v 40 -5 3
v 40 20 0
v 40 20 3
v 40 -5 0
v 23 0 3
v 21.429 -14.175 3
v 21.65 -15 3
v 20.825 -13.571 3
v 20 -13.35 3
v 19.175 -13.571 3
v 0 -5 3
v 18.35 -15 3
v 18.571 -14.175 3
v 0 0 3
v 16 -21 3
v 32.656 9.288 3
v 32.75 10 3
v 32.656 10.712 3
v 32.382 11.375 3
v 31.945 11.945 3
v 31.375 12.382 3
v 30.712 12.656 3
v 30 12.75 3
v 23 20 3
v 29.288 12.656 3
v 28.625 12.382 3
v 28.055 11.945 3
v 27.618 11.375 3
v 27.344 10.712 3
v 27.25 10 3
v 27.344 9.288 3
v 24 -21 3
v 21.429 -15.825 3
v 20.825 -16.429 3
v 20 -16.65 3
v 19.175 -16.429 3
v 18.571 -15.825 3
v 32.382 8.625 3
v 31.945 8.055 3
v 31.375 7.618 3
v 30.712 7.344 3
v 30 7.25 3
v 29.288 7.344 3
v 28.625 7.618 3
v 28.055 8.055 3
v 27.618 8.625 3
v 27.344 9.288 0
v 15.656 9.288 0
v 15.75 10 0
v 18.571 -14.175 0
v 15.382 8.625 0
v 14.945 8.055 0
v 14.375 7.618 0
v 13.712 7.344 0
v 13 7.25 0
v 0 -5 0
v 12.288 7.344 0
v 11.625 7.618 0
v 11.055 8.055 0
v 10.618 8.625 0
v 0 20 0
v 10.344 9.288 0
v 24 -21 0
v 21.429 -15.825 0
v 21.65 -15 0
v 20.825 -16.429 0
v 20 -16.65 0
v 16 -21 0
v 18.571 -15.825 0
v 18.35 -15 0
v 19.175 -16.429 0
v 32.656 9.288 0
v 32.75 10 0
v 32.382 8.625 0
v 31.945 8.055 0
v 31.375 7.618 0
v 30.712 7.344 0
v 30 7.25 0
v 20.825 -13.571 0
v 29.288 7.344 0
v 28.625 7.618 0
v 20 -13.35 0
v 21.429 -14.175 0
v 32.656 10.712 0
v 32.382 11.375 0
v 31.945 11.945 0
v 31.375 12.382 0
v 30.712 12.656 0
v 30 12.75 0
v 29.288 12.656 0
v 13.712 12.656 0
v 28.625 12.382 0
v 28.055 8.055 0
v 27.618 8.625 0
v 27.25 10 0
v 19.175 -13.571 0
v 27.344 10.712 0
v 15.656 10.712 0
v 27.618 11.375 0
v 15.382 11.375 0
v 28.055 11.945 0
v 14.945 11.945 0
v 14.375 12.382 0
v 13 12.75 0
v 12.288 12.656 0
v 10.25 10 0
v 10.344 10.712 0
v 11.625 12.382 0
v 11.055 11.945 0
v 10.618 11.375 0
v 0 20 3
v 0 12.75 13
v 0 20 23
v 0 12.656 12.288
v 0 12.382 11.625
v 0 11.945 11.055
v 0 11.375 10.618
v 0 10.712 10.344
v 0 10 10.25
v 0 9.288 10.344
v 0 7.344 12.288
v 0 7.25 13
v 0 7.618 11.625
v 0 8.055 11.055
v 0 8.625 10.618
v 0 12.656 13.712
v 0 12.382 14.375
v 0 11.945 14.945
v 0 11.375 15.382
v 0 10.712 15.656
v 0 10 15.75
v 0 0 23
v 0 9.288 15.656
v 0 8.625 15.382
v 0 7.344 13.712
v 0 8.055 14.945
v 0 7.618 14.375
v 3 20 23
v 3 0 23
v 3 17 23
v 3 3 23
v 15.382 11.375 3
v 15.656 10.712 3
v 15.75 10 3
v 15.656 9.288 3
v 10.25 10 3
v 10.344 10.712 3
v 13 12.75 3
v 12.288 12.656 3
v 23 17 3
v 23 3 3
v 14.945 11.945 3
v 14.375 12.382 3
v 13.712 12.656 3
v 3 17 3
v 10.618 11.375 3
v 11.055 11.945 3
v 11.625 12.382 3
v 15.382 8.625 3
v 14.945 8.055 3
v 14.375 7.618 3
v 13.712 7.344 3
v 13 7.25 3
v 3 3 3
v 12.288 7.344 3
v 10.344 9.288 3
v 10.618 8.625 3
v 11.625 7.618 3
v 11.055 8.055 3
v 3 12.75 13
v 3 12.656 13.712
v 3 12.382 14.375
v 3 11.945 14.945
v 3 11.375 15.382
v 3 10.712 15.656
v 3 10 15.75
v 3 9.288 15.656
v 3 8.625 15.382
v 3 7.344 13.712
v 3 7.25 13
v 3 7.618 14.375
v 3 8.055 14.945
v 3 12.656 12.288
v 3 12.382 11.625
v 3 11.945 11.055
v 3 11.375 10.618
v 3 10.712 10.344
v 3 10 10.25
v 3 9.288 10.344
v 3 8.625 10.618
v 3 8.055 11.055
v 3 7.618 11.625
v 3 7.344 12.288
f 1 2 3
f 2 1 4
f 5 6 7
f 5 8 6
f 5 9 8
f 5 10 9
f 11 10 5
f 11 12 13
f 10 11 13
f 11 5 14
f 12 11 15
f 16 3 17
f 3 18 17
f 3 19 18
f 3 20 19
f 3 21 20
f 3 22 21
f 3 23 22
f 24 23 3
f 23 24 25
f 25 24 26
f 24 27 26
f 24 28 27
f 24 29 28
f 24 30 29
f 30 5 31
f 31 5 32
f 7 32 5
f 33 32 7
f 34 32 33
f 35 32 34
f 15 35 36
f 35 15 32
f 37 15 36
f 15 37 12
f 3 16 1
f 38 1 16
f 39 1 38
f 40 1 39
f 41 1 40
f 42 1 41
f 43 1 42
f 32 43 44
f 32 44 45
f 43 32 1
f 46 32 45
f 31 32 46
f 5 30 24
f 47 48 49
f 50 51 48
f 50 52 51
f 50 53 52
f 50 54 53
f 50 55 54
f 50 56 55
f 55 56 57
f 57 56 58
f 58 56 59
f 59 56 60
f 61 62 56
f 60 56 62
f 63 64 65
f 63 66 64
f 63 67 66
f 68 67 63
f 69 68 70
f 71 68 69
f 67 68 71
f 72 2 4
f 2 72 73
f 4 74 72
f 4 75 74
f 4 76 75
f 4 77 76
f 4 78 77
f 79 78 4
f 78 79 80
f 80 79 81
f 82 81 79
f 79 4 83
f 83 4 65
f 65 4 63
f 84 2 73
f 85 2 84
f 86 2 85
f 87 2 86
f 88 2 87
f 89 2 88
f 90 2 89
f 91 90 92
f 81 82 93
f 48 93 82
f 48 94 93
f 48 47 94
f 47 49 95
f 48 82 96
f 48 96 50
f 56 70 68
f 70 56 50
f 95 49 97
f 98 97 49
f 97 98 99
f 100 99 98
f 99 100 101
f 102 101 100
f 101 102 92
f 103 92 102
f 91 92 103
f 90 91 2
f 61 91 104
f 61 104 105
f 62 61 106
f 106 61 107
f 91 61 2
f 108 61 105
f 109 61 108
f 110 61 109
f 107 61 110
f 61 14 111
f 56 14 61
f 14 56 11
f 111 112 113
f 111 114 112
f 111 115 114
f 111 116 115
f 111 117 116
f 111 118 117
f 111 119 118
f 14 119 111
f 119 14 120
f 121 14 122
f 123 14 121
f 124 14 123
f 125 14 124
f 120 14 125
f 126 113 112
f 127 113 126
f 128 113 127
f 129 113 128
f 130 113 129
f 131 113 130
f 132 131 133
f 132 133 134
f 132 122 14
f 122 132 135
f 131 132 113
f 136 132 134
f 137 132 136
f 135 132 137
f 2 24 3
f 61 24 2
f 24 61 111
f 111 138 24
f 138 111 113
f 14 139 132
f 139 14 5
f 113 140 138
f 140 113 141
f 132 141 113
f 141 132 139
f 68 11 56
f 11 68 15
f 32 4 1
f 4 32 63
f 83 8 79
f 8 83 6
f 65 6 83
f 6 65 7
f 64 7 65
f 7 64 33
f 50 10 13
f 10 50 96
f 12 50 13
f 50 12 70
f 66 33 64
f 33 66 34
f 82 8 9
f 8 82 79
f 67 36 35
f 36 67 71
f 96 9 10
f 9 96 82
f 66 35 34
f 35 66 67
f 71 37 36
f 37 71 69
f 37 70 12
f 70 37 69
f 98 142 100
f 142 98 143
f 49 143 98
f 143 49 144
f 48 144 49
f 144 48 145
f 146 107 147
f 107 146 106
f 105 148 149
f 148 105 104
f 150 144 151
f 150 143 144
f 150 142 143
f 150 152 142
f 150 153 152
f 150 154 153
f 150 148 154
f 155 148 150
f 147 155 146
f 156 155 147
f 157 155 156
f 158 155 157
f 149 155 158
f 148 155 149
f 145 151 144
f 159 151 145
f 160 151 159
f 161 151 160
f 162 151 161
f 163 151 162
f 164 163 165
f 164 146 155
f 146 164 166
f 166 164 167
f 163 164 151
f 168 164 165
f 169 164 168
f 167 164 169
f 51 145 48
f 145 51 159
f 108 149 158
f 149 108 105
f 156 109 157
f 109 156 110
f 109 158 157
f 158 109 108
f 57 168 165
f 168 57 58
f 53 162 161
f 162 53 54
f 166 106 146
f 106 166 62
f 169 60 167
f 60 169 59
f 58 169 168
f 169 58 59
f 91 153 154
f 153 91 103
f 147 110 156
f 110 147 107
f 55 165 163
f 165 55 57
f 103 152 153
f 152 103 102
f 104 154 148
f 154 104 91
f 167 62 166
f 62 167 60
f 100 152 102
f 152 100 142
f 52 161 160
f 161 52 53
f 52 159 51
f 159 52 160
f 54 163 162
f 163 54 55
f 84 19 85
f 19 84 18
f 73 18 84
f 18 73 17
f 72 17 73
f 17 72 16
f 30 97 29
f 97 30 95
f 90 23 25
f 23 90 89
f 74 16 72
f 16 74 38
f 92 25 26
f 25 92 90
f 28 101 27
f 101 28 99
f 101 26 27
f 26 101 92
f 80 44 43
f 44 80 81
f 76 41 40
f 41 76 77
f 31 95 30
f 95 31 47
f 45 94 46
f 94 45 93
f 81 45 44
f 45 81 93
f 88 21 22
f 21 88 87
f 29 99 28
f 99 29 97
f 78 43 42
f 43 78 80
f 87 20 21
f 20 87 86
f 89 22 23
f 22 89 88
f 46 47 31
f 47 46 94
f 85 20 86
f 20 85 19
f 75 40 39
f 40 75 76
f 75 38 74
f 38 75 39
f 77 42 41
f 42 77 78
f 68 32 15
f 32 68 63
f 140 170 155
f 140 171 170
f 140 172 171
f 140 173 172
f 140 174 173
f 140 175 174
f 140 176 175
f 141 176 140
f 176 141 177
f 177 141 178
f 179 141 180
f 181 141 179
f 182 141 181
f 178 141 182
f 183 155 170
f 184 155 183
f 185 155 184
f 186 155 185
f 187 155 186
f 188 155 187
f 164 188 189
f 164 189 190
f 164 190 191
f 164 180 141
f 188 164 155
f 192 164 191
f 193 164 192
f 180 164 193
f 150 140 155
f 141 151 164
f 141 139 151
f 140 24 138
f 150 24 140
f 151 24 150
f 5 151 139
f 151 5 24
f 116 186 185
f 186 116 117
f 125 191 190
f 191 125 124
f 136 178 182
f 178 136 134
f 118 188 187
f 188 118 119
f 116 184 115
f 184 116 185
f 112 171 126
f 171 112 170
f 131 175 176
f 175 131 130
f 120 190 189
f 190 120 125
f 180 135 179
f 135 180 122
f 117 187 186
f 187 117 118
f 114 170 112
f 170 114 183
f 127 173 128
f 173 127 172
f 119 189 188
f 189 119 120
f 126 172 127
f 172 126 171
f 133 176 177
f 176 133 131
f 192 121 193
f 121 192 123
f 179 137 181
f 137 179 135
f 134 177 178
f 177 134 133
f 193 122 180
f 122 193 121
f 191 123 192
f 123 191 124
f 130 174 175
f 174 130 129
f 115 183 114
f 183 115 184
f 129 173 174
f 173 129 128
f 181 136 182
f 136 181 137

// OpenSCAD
difference()
{
    union()
    {
        cube([40,20,3]);
        
        cube([23,20,23]);
        
        translate([20,-20-5,0])
            rotate([0,0,45])
                cube([40,40,3]);
    }
    union()
    {
        translate([20,-20+5,0])
            cylinder(d=3.3,h=3,$fn=12);
        
        translate([10+3,10,0])
            cylinder(d=5.5,h=3,$fn=24);
        translate([30,10,0])
            cylinder(d=5.5,h=3,$fn=24);
        
        translate([0,-20-5,0])
            cube([40,4,3]);
        
        translate([0,20,0])
            cube([40,20,3]);
        
        translate([-20,-10,0])
            cube([20,30,3]);
        translate([40,-10,0])
            cube([20,30,3]);
        
        translate([3,3,3])
            cube([20,20-3*2,20]);
            
        translate([3,0,23])
            rotate([0,45,0])
                cube([20*sqrt(2),20,20*sqrt(2)]);
                
        translate([0,10,3+20/2])
            rotate([0,90,0])
                cylinder(d=5.5,h=3+1,$fn=24);
        
    }
}
